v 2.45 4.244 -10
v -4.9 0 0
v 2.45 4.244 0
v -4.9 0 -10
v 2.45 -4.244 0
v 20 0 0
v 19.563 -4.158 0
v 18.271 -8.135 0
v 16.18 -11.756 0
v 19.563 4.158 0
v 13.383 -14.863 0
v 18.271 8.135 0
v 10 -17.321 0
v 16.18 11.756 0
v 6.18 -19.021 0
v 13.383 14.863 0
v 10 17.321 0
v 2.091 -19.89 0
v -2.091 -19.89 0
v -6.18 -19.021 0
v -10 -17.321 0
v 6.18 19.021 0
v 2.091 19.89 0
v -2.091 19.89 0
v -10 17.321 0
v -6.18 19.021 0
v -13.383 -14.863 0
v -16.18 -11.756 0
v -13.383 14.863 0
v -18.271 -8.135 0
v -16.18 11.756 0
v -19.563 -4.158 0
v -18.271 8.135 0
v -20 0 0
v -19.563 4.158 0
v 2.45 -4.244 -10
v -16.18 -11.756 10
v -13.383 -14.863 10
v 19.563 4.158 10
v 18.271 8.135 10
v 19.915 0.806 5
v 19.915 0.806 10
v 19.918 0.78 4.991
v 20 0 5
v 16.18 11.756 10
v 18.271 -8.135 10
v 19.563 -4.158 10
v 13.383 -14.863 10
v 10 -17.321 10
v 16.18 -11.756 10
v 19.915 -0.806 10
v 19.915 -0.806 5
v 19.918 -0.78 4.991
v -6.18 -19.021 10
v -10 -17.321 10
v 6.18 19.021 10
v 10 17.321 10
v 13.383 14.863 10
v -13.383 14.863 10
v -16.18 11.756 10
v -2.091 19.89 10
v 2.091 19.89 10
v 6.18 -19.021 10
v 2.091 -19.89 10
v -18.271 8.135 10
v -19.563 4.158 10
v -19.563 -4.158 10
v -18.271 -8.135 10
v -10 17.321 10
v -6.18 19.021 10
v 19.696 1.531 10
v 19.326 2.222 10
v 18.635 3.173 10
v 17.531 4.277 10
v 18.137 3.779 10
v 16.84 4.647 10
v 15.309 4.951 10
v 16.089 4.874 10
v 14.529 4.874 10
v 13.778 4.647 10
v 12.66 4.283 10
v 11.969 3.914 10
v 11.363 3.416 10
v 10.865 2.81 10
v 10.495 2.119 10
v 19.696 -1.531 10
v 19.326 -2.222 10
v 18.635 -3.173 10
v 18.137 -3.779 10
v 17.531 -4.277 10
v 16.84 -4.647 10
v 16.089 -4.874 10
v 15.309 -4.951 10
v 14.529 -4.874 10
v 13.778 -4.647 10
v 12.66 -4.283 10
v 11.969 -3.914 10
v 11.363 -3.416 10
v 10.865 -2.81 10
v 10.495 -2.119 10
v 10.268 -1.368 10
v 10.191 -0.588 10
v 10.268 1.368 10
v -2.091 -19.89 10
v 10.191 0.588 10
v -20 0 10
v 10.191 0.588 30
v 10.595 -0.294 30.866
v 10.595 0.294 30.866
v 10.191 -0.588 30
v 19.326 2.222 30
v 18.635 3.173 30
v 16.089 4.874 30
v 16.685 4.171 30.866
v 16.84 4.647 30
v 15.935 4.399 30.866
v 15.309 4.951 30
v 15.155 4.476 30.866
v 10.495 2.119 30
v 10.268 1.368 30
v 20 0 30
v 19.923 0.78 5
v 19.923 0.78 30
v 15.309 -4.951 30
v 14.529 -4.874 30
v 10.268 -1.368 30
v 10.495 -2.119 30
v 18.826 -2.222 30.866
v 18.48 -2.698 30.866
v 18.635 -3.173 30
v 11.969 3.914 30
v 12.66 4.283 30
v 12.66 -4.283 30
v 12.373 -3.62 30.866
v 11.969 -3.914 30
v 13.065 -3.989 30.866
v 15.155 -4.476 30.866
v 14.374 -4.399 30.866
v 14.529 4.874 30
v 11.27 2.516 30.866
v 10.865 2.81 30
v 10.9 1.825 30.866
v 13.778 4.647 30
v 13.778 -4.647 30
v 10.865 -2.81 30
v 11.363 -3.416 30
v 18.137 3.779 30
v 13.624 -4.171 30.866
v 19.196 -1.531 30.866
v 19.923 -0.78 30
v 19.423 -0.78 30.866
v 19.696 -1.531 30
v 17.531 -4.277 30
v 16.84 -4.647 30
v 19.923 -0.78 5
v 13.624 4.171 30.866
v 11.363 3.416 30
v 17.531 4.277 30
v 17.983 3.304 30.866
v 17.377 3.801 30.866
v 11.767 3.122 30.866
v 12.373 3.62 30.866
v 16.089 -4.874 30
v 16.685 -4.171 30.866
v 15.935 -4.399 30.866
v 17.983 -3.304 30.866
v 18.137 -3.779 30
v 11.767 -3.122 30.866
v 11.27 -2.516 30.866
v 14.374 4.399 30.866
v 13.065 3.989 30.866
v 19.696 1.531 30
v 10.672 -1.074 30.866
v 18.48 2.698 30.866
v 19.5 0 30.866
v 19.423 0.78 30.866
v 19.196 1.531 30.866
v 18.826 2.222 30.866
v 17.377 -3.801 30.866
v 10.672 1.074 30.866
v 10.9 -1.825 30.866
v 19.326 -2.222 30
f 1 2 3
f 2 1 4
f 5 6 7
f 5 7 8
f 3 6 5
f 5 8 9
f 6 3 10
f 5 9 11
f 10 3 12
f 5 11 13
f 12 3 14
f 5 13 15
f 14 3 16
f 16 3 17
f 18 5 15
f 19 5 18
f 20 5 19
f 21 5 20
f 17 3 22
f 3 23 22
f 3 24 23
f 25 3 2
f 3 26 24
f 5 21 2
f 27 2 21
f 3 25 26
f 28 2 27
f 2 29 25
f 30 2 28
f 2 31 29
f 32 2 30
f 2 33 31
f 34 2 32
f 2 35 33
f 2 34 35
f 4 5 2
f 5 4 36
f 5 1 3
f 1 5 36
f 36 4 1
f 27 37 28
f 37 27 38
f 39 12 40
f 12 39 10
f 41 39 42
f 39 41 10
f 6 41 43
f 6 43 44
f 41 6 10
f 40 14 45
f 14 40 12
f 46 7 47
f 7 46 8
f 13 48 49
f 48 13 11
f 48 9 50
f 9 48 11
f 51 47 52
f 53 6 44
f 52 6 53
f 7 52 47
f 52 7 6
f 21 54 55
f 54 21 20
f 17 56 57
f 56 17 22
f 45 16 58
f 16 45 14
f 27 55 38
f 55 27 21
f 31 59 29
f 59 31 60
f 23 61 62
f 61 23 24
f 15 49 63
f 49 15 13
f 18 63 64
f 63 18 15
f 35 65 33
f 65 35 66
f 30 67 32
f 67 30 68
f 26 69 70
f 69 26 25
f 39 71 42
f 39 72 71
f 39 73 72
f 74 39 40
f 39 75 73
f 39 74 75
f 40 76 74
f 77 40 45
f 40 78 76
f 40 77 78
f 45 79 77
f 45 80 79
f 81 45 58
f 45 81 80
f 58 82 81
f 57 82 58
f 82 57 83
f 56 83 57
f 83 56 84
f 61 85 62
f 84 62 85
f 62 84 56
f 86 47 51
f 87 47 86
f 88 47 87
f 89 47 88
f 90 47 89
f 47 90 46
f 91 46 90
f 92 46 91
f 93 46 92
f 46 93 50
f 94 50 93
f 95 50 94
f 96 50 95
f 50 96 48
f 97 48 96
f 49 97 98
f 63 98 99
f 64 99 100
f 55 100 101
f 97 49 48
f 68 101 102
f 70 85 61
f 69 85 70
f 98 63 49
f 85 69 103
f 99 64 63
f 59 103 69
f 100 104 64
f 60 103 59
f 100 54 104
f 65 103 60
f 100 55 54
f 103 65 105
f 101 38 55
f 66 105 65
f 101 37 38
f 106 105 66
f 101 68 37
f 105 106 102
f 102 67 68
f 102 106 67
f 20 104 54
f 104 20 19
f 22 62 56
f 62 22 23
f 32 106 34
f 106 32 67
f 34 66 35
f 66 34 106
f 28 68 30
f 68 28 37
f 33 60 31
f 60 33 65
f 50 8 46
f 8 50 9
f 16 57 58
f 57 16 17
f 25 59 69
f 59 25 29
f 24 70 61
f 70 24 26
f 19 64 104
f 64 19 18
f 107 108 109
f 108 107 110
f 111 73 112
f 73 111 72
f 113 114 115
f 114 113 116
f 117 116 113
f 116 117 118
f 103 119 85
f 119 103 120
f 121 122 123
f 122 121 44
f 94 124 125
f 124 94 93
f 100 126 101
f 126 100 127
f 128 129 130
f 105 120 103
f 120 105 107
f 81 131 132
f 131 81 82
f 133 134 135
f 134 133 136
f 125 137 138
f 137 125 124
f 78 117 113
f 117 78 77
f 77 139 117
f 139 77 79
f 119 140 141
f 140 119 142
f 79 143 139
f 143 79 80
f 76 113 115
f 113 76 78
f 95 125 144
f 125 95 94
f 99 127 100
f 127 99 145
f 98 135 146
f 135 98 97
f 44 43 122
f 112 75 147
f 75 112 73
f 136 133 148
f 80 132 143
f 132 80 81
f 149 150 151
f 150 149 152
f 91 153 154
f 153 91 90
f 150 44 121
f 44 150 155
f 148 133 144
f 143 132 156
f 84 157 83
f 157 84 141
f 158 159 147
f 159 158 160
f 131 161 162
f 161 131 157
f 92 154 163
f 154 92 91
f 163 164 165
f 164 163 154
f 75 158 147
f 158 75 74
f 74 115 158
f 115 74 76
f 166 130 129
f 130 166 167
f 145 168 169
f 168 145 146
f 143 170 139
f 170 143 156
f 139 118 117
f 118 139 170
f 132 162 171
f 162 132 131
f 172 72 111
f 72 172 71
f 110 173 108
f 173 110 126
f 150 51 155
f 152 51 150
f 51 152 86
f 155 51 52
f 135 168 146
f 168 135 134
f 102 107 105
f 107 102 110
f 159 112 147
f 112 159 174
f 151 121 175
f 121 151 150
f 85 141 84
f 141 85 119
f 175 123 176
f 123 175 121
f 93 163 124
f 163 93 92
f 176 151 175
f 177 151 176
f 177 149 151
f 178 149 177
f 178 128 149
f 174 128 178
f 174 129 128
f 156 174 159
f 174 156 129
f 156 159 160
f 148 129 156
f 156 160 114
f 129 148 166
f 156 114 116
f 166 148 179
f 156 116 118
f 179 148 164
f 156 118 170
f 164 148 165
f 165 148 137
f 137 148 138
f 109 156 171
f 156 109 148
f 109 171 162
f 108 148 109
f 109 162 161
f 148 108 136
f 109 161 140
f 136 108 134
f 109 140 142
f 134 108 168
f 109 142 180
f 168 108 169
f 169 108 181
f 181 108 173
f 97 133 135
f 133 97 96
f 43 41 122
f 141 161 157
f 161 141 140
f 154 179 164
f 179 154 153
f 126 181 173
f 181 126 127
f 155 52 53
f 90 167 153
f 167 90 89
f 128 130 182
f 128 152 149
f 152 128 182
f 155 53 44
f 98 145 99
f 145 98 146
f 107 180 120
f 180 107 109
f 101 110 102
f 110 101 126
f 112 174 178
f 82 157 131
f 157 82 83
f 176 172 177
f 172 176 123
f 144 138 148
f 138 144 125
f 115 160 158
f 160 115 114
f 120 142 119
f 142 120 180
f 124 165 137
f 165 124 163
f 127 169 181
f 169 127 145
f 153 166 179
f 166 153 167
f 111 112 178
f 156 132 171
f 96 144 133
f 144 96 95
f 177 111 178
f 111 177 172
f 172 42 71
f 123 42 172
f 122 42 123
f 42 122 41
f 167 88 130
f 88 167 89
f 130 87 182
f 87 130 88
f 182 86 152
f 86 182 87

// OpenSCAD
// diameter of the center plug
plug = 10;
// depth of the center plug
h_plug = 10;
// sides of the center plug
sides = 3;
// tolerance 
tolerance = 0.1;

// distance plate diameter
dd = 40;
// distance plate depth
distance = 10;

// handle diameter
handle = 10;
// thumb wheel depth
hd = 20;

translate([0,0,-h_plug])
  rotate([0,0,60])
    cylinder(r=plug/2-tolerance, h=h_plug, $fn=sides);

cylinder(r=dd/2, h=distance);

minkowski() {
translate([(dd-handle)/2,0,distance/2])
  cylinder(r=handle/2-1, h=hd+distance/2, $fn=32);
sphere(1);
}
